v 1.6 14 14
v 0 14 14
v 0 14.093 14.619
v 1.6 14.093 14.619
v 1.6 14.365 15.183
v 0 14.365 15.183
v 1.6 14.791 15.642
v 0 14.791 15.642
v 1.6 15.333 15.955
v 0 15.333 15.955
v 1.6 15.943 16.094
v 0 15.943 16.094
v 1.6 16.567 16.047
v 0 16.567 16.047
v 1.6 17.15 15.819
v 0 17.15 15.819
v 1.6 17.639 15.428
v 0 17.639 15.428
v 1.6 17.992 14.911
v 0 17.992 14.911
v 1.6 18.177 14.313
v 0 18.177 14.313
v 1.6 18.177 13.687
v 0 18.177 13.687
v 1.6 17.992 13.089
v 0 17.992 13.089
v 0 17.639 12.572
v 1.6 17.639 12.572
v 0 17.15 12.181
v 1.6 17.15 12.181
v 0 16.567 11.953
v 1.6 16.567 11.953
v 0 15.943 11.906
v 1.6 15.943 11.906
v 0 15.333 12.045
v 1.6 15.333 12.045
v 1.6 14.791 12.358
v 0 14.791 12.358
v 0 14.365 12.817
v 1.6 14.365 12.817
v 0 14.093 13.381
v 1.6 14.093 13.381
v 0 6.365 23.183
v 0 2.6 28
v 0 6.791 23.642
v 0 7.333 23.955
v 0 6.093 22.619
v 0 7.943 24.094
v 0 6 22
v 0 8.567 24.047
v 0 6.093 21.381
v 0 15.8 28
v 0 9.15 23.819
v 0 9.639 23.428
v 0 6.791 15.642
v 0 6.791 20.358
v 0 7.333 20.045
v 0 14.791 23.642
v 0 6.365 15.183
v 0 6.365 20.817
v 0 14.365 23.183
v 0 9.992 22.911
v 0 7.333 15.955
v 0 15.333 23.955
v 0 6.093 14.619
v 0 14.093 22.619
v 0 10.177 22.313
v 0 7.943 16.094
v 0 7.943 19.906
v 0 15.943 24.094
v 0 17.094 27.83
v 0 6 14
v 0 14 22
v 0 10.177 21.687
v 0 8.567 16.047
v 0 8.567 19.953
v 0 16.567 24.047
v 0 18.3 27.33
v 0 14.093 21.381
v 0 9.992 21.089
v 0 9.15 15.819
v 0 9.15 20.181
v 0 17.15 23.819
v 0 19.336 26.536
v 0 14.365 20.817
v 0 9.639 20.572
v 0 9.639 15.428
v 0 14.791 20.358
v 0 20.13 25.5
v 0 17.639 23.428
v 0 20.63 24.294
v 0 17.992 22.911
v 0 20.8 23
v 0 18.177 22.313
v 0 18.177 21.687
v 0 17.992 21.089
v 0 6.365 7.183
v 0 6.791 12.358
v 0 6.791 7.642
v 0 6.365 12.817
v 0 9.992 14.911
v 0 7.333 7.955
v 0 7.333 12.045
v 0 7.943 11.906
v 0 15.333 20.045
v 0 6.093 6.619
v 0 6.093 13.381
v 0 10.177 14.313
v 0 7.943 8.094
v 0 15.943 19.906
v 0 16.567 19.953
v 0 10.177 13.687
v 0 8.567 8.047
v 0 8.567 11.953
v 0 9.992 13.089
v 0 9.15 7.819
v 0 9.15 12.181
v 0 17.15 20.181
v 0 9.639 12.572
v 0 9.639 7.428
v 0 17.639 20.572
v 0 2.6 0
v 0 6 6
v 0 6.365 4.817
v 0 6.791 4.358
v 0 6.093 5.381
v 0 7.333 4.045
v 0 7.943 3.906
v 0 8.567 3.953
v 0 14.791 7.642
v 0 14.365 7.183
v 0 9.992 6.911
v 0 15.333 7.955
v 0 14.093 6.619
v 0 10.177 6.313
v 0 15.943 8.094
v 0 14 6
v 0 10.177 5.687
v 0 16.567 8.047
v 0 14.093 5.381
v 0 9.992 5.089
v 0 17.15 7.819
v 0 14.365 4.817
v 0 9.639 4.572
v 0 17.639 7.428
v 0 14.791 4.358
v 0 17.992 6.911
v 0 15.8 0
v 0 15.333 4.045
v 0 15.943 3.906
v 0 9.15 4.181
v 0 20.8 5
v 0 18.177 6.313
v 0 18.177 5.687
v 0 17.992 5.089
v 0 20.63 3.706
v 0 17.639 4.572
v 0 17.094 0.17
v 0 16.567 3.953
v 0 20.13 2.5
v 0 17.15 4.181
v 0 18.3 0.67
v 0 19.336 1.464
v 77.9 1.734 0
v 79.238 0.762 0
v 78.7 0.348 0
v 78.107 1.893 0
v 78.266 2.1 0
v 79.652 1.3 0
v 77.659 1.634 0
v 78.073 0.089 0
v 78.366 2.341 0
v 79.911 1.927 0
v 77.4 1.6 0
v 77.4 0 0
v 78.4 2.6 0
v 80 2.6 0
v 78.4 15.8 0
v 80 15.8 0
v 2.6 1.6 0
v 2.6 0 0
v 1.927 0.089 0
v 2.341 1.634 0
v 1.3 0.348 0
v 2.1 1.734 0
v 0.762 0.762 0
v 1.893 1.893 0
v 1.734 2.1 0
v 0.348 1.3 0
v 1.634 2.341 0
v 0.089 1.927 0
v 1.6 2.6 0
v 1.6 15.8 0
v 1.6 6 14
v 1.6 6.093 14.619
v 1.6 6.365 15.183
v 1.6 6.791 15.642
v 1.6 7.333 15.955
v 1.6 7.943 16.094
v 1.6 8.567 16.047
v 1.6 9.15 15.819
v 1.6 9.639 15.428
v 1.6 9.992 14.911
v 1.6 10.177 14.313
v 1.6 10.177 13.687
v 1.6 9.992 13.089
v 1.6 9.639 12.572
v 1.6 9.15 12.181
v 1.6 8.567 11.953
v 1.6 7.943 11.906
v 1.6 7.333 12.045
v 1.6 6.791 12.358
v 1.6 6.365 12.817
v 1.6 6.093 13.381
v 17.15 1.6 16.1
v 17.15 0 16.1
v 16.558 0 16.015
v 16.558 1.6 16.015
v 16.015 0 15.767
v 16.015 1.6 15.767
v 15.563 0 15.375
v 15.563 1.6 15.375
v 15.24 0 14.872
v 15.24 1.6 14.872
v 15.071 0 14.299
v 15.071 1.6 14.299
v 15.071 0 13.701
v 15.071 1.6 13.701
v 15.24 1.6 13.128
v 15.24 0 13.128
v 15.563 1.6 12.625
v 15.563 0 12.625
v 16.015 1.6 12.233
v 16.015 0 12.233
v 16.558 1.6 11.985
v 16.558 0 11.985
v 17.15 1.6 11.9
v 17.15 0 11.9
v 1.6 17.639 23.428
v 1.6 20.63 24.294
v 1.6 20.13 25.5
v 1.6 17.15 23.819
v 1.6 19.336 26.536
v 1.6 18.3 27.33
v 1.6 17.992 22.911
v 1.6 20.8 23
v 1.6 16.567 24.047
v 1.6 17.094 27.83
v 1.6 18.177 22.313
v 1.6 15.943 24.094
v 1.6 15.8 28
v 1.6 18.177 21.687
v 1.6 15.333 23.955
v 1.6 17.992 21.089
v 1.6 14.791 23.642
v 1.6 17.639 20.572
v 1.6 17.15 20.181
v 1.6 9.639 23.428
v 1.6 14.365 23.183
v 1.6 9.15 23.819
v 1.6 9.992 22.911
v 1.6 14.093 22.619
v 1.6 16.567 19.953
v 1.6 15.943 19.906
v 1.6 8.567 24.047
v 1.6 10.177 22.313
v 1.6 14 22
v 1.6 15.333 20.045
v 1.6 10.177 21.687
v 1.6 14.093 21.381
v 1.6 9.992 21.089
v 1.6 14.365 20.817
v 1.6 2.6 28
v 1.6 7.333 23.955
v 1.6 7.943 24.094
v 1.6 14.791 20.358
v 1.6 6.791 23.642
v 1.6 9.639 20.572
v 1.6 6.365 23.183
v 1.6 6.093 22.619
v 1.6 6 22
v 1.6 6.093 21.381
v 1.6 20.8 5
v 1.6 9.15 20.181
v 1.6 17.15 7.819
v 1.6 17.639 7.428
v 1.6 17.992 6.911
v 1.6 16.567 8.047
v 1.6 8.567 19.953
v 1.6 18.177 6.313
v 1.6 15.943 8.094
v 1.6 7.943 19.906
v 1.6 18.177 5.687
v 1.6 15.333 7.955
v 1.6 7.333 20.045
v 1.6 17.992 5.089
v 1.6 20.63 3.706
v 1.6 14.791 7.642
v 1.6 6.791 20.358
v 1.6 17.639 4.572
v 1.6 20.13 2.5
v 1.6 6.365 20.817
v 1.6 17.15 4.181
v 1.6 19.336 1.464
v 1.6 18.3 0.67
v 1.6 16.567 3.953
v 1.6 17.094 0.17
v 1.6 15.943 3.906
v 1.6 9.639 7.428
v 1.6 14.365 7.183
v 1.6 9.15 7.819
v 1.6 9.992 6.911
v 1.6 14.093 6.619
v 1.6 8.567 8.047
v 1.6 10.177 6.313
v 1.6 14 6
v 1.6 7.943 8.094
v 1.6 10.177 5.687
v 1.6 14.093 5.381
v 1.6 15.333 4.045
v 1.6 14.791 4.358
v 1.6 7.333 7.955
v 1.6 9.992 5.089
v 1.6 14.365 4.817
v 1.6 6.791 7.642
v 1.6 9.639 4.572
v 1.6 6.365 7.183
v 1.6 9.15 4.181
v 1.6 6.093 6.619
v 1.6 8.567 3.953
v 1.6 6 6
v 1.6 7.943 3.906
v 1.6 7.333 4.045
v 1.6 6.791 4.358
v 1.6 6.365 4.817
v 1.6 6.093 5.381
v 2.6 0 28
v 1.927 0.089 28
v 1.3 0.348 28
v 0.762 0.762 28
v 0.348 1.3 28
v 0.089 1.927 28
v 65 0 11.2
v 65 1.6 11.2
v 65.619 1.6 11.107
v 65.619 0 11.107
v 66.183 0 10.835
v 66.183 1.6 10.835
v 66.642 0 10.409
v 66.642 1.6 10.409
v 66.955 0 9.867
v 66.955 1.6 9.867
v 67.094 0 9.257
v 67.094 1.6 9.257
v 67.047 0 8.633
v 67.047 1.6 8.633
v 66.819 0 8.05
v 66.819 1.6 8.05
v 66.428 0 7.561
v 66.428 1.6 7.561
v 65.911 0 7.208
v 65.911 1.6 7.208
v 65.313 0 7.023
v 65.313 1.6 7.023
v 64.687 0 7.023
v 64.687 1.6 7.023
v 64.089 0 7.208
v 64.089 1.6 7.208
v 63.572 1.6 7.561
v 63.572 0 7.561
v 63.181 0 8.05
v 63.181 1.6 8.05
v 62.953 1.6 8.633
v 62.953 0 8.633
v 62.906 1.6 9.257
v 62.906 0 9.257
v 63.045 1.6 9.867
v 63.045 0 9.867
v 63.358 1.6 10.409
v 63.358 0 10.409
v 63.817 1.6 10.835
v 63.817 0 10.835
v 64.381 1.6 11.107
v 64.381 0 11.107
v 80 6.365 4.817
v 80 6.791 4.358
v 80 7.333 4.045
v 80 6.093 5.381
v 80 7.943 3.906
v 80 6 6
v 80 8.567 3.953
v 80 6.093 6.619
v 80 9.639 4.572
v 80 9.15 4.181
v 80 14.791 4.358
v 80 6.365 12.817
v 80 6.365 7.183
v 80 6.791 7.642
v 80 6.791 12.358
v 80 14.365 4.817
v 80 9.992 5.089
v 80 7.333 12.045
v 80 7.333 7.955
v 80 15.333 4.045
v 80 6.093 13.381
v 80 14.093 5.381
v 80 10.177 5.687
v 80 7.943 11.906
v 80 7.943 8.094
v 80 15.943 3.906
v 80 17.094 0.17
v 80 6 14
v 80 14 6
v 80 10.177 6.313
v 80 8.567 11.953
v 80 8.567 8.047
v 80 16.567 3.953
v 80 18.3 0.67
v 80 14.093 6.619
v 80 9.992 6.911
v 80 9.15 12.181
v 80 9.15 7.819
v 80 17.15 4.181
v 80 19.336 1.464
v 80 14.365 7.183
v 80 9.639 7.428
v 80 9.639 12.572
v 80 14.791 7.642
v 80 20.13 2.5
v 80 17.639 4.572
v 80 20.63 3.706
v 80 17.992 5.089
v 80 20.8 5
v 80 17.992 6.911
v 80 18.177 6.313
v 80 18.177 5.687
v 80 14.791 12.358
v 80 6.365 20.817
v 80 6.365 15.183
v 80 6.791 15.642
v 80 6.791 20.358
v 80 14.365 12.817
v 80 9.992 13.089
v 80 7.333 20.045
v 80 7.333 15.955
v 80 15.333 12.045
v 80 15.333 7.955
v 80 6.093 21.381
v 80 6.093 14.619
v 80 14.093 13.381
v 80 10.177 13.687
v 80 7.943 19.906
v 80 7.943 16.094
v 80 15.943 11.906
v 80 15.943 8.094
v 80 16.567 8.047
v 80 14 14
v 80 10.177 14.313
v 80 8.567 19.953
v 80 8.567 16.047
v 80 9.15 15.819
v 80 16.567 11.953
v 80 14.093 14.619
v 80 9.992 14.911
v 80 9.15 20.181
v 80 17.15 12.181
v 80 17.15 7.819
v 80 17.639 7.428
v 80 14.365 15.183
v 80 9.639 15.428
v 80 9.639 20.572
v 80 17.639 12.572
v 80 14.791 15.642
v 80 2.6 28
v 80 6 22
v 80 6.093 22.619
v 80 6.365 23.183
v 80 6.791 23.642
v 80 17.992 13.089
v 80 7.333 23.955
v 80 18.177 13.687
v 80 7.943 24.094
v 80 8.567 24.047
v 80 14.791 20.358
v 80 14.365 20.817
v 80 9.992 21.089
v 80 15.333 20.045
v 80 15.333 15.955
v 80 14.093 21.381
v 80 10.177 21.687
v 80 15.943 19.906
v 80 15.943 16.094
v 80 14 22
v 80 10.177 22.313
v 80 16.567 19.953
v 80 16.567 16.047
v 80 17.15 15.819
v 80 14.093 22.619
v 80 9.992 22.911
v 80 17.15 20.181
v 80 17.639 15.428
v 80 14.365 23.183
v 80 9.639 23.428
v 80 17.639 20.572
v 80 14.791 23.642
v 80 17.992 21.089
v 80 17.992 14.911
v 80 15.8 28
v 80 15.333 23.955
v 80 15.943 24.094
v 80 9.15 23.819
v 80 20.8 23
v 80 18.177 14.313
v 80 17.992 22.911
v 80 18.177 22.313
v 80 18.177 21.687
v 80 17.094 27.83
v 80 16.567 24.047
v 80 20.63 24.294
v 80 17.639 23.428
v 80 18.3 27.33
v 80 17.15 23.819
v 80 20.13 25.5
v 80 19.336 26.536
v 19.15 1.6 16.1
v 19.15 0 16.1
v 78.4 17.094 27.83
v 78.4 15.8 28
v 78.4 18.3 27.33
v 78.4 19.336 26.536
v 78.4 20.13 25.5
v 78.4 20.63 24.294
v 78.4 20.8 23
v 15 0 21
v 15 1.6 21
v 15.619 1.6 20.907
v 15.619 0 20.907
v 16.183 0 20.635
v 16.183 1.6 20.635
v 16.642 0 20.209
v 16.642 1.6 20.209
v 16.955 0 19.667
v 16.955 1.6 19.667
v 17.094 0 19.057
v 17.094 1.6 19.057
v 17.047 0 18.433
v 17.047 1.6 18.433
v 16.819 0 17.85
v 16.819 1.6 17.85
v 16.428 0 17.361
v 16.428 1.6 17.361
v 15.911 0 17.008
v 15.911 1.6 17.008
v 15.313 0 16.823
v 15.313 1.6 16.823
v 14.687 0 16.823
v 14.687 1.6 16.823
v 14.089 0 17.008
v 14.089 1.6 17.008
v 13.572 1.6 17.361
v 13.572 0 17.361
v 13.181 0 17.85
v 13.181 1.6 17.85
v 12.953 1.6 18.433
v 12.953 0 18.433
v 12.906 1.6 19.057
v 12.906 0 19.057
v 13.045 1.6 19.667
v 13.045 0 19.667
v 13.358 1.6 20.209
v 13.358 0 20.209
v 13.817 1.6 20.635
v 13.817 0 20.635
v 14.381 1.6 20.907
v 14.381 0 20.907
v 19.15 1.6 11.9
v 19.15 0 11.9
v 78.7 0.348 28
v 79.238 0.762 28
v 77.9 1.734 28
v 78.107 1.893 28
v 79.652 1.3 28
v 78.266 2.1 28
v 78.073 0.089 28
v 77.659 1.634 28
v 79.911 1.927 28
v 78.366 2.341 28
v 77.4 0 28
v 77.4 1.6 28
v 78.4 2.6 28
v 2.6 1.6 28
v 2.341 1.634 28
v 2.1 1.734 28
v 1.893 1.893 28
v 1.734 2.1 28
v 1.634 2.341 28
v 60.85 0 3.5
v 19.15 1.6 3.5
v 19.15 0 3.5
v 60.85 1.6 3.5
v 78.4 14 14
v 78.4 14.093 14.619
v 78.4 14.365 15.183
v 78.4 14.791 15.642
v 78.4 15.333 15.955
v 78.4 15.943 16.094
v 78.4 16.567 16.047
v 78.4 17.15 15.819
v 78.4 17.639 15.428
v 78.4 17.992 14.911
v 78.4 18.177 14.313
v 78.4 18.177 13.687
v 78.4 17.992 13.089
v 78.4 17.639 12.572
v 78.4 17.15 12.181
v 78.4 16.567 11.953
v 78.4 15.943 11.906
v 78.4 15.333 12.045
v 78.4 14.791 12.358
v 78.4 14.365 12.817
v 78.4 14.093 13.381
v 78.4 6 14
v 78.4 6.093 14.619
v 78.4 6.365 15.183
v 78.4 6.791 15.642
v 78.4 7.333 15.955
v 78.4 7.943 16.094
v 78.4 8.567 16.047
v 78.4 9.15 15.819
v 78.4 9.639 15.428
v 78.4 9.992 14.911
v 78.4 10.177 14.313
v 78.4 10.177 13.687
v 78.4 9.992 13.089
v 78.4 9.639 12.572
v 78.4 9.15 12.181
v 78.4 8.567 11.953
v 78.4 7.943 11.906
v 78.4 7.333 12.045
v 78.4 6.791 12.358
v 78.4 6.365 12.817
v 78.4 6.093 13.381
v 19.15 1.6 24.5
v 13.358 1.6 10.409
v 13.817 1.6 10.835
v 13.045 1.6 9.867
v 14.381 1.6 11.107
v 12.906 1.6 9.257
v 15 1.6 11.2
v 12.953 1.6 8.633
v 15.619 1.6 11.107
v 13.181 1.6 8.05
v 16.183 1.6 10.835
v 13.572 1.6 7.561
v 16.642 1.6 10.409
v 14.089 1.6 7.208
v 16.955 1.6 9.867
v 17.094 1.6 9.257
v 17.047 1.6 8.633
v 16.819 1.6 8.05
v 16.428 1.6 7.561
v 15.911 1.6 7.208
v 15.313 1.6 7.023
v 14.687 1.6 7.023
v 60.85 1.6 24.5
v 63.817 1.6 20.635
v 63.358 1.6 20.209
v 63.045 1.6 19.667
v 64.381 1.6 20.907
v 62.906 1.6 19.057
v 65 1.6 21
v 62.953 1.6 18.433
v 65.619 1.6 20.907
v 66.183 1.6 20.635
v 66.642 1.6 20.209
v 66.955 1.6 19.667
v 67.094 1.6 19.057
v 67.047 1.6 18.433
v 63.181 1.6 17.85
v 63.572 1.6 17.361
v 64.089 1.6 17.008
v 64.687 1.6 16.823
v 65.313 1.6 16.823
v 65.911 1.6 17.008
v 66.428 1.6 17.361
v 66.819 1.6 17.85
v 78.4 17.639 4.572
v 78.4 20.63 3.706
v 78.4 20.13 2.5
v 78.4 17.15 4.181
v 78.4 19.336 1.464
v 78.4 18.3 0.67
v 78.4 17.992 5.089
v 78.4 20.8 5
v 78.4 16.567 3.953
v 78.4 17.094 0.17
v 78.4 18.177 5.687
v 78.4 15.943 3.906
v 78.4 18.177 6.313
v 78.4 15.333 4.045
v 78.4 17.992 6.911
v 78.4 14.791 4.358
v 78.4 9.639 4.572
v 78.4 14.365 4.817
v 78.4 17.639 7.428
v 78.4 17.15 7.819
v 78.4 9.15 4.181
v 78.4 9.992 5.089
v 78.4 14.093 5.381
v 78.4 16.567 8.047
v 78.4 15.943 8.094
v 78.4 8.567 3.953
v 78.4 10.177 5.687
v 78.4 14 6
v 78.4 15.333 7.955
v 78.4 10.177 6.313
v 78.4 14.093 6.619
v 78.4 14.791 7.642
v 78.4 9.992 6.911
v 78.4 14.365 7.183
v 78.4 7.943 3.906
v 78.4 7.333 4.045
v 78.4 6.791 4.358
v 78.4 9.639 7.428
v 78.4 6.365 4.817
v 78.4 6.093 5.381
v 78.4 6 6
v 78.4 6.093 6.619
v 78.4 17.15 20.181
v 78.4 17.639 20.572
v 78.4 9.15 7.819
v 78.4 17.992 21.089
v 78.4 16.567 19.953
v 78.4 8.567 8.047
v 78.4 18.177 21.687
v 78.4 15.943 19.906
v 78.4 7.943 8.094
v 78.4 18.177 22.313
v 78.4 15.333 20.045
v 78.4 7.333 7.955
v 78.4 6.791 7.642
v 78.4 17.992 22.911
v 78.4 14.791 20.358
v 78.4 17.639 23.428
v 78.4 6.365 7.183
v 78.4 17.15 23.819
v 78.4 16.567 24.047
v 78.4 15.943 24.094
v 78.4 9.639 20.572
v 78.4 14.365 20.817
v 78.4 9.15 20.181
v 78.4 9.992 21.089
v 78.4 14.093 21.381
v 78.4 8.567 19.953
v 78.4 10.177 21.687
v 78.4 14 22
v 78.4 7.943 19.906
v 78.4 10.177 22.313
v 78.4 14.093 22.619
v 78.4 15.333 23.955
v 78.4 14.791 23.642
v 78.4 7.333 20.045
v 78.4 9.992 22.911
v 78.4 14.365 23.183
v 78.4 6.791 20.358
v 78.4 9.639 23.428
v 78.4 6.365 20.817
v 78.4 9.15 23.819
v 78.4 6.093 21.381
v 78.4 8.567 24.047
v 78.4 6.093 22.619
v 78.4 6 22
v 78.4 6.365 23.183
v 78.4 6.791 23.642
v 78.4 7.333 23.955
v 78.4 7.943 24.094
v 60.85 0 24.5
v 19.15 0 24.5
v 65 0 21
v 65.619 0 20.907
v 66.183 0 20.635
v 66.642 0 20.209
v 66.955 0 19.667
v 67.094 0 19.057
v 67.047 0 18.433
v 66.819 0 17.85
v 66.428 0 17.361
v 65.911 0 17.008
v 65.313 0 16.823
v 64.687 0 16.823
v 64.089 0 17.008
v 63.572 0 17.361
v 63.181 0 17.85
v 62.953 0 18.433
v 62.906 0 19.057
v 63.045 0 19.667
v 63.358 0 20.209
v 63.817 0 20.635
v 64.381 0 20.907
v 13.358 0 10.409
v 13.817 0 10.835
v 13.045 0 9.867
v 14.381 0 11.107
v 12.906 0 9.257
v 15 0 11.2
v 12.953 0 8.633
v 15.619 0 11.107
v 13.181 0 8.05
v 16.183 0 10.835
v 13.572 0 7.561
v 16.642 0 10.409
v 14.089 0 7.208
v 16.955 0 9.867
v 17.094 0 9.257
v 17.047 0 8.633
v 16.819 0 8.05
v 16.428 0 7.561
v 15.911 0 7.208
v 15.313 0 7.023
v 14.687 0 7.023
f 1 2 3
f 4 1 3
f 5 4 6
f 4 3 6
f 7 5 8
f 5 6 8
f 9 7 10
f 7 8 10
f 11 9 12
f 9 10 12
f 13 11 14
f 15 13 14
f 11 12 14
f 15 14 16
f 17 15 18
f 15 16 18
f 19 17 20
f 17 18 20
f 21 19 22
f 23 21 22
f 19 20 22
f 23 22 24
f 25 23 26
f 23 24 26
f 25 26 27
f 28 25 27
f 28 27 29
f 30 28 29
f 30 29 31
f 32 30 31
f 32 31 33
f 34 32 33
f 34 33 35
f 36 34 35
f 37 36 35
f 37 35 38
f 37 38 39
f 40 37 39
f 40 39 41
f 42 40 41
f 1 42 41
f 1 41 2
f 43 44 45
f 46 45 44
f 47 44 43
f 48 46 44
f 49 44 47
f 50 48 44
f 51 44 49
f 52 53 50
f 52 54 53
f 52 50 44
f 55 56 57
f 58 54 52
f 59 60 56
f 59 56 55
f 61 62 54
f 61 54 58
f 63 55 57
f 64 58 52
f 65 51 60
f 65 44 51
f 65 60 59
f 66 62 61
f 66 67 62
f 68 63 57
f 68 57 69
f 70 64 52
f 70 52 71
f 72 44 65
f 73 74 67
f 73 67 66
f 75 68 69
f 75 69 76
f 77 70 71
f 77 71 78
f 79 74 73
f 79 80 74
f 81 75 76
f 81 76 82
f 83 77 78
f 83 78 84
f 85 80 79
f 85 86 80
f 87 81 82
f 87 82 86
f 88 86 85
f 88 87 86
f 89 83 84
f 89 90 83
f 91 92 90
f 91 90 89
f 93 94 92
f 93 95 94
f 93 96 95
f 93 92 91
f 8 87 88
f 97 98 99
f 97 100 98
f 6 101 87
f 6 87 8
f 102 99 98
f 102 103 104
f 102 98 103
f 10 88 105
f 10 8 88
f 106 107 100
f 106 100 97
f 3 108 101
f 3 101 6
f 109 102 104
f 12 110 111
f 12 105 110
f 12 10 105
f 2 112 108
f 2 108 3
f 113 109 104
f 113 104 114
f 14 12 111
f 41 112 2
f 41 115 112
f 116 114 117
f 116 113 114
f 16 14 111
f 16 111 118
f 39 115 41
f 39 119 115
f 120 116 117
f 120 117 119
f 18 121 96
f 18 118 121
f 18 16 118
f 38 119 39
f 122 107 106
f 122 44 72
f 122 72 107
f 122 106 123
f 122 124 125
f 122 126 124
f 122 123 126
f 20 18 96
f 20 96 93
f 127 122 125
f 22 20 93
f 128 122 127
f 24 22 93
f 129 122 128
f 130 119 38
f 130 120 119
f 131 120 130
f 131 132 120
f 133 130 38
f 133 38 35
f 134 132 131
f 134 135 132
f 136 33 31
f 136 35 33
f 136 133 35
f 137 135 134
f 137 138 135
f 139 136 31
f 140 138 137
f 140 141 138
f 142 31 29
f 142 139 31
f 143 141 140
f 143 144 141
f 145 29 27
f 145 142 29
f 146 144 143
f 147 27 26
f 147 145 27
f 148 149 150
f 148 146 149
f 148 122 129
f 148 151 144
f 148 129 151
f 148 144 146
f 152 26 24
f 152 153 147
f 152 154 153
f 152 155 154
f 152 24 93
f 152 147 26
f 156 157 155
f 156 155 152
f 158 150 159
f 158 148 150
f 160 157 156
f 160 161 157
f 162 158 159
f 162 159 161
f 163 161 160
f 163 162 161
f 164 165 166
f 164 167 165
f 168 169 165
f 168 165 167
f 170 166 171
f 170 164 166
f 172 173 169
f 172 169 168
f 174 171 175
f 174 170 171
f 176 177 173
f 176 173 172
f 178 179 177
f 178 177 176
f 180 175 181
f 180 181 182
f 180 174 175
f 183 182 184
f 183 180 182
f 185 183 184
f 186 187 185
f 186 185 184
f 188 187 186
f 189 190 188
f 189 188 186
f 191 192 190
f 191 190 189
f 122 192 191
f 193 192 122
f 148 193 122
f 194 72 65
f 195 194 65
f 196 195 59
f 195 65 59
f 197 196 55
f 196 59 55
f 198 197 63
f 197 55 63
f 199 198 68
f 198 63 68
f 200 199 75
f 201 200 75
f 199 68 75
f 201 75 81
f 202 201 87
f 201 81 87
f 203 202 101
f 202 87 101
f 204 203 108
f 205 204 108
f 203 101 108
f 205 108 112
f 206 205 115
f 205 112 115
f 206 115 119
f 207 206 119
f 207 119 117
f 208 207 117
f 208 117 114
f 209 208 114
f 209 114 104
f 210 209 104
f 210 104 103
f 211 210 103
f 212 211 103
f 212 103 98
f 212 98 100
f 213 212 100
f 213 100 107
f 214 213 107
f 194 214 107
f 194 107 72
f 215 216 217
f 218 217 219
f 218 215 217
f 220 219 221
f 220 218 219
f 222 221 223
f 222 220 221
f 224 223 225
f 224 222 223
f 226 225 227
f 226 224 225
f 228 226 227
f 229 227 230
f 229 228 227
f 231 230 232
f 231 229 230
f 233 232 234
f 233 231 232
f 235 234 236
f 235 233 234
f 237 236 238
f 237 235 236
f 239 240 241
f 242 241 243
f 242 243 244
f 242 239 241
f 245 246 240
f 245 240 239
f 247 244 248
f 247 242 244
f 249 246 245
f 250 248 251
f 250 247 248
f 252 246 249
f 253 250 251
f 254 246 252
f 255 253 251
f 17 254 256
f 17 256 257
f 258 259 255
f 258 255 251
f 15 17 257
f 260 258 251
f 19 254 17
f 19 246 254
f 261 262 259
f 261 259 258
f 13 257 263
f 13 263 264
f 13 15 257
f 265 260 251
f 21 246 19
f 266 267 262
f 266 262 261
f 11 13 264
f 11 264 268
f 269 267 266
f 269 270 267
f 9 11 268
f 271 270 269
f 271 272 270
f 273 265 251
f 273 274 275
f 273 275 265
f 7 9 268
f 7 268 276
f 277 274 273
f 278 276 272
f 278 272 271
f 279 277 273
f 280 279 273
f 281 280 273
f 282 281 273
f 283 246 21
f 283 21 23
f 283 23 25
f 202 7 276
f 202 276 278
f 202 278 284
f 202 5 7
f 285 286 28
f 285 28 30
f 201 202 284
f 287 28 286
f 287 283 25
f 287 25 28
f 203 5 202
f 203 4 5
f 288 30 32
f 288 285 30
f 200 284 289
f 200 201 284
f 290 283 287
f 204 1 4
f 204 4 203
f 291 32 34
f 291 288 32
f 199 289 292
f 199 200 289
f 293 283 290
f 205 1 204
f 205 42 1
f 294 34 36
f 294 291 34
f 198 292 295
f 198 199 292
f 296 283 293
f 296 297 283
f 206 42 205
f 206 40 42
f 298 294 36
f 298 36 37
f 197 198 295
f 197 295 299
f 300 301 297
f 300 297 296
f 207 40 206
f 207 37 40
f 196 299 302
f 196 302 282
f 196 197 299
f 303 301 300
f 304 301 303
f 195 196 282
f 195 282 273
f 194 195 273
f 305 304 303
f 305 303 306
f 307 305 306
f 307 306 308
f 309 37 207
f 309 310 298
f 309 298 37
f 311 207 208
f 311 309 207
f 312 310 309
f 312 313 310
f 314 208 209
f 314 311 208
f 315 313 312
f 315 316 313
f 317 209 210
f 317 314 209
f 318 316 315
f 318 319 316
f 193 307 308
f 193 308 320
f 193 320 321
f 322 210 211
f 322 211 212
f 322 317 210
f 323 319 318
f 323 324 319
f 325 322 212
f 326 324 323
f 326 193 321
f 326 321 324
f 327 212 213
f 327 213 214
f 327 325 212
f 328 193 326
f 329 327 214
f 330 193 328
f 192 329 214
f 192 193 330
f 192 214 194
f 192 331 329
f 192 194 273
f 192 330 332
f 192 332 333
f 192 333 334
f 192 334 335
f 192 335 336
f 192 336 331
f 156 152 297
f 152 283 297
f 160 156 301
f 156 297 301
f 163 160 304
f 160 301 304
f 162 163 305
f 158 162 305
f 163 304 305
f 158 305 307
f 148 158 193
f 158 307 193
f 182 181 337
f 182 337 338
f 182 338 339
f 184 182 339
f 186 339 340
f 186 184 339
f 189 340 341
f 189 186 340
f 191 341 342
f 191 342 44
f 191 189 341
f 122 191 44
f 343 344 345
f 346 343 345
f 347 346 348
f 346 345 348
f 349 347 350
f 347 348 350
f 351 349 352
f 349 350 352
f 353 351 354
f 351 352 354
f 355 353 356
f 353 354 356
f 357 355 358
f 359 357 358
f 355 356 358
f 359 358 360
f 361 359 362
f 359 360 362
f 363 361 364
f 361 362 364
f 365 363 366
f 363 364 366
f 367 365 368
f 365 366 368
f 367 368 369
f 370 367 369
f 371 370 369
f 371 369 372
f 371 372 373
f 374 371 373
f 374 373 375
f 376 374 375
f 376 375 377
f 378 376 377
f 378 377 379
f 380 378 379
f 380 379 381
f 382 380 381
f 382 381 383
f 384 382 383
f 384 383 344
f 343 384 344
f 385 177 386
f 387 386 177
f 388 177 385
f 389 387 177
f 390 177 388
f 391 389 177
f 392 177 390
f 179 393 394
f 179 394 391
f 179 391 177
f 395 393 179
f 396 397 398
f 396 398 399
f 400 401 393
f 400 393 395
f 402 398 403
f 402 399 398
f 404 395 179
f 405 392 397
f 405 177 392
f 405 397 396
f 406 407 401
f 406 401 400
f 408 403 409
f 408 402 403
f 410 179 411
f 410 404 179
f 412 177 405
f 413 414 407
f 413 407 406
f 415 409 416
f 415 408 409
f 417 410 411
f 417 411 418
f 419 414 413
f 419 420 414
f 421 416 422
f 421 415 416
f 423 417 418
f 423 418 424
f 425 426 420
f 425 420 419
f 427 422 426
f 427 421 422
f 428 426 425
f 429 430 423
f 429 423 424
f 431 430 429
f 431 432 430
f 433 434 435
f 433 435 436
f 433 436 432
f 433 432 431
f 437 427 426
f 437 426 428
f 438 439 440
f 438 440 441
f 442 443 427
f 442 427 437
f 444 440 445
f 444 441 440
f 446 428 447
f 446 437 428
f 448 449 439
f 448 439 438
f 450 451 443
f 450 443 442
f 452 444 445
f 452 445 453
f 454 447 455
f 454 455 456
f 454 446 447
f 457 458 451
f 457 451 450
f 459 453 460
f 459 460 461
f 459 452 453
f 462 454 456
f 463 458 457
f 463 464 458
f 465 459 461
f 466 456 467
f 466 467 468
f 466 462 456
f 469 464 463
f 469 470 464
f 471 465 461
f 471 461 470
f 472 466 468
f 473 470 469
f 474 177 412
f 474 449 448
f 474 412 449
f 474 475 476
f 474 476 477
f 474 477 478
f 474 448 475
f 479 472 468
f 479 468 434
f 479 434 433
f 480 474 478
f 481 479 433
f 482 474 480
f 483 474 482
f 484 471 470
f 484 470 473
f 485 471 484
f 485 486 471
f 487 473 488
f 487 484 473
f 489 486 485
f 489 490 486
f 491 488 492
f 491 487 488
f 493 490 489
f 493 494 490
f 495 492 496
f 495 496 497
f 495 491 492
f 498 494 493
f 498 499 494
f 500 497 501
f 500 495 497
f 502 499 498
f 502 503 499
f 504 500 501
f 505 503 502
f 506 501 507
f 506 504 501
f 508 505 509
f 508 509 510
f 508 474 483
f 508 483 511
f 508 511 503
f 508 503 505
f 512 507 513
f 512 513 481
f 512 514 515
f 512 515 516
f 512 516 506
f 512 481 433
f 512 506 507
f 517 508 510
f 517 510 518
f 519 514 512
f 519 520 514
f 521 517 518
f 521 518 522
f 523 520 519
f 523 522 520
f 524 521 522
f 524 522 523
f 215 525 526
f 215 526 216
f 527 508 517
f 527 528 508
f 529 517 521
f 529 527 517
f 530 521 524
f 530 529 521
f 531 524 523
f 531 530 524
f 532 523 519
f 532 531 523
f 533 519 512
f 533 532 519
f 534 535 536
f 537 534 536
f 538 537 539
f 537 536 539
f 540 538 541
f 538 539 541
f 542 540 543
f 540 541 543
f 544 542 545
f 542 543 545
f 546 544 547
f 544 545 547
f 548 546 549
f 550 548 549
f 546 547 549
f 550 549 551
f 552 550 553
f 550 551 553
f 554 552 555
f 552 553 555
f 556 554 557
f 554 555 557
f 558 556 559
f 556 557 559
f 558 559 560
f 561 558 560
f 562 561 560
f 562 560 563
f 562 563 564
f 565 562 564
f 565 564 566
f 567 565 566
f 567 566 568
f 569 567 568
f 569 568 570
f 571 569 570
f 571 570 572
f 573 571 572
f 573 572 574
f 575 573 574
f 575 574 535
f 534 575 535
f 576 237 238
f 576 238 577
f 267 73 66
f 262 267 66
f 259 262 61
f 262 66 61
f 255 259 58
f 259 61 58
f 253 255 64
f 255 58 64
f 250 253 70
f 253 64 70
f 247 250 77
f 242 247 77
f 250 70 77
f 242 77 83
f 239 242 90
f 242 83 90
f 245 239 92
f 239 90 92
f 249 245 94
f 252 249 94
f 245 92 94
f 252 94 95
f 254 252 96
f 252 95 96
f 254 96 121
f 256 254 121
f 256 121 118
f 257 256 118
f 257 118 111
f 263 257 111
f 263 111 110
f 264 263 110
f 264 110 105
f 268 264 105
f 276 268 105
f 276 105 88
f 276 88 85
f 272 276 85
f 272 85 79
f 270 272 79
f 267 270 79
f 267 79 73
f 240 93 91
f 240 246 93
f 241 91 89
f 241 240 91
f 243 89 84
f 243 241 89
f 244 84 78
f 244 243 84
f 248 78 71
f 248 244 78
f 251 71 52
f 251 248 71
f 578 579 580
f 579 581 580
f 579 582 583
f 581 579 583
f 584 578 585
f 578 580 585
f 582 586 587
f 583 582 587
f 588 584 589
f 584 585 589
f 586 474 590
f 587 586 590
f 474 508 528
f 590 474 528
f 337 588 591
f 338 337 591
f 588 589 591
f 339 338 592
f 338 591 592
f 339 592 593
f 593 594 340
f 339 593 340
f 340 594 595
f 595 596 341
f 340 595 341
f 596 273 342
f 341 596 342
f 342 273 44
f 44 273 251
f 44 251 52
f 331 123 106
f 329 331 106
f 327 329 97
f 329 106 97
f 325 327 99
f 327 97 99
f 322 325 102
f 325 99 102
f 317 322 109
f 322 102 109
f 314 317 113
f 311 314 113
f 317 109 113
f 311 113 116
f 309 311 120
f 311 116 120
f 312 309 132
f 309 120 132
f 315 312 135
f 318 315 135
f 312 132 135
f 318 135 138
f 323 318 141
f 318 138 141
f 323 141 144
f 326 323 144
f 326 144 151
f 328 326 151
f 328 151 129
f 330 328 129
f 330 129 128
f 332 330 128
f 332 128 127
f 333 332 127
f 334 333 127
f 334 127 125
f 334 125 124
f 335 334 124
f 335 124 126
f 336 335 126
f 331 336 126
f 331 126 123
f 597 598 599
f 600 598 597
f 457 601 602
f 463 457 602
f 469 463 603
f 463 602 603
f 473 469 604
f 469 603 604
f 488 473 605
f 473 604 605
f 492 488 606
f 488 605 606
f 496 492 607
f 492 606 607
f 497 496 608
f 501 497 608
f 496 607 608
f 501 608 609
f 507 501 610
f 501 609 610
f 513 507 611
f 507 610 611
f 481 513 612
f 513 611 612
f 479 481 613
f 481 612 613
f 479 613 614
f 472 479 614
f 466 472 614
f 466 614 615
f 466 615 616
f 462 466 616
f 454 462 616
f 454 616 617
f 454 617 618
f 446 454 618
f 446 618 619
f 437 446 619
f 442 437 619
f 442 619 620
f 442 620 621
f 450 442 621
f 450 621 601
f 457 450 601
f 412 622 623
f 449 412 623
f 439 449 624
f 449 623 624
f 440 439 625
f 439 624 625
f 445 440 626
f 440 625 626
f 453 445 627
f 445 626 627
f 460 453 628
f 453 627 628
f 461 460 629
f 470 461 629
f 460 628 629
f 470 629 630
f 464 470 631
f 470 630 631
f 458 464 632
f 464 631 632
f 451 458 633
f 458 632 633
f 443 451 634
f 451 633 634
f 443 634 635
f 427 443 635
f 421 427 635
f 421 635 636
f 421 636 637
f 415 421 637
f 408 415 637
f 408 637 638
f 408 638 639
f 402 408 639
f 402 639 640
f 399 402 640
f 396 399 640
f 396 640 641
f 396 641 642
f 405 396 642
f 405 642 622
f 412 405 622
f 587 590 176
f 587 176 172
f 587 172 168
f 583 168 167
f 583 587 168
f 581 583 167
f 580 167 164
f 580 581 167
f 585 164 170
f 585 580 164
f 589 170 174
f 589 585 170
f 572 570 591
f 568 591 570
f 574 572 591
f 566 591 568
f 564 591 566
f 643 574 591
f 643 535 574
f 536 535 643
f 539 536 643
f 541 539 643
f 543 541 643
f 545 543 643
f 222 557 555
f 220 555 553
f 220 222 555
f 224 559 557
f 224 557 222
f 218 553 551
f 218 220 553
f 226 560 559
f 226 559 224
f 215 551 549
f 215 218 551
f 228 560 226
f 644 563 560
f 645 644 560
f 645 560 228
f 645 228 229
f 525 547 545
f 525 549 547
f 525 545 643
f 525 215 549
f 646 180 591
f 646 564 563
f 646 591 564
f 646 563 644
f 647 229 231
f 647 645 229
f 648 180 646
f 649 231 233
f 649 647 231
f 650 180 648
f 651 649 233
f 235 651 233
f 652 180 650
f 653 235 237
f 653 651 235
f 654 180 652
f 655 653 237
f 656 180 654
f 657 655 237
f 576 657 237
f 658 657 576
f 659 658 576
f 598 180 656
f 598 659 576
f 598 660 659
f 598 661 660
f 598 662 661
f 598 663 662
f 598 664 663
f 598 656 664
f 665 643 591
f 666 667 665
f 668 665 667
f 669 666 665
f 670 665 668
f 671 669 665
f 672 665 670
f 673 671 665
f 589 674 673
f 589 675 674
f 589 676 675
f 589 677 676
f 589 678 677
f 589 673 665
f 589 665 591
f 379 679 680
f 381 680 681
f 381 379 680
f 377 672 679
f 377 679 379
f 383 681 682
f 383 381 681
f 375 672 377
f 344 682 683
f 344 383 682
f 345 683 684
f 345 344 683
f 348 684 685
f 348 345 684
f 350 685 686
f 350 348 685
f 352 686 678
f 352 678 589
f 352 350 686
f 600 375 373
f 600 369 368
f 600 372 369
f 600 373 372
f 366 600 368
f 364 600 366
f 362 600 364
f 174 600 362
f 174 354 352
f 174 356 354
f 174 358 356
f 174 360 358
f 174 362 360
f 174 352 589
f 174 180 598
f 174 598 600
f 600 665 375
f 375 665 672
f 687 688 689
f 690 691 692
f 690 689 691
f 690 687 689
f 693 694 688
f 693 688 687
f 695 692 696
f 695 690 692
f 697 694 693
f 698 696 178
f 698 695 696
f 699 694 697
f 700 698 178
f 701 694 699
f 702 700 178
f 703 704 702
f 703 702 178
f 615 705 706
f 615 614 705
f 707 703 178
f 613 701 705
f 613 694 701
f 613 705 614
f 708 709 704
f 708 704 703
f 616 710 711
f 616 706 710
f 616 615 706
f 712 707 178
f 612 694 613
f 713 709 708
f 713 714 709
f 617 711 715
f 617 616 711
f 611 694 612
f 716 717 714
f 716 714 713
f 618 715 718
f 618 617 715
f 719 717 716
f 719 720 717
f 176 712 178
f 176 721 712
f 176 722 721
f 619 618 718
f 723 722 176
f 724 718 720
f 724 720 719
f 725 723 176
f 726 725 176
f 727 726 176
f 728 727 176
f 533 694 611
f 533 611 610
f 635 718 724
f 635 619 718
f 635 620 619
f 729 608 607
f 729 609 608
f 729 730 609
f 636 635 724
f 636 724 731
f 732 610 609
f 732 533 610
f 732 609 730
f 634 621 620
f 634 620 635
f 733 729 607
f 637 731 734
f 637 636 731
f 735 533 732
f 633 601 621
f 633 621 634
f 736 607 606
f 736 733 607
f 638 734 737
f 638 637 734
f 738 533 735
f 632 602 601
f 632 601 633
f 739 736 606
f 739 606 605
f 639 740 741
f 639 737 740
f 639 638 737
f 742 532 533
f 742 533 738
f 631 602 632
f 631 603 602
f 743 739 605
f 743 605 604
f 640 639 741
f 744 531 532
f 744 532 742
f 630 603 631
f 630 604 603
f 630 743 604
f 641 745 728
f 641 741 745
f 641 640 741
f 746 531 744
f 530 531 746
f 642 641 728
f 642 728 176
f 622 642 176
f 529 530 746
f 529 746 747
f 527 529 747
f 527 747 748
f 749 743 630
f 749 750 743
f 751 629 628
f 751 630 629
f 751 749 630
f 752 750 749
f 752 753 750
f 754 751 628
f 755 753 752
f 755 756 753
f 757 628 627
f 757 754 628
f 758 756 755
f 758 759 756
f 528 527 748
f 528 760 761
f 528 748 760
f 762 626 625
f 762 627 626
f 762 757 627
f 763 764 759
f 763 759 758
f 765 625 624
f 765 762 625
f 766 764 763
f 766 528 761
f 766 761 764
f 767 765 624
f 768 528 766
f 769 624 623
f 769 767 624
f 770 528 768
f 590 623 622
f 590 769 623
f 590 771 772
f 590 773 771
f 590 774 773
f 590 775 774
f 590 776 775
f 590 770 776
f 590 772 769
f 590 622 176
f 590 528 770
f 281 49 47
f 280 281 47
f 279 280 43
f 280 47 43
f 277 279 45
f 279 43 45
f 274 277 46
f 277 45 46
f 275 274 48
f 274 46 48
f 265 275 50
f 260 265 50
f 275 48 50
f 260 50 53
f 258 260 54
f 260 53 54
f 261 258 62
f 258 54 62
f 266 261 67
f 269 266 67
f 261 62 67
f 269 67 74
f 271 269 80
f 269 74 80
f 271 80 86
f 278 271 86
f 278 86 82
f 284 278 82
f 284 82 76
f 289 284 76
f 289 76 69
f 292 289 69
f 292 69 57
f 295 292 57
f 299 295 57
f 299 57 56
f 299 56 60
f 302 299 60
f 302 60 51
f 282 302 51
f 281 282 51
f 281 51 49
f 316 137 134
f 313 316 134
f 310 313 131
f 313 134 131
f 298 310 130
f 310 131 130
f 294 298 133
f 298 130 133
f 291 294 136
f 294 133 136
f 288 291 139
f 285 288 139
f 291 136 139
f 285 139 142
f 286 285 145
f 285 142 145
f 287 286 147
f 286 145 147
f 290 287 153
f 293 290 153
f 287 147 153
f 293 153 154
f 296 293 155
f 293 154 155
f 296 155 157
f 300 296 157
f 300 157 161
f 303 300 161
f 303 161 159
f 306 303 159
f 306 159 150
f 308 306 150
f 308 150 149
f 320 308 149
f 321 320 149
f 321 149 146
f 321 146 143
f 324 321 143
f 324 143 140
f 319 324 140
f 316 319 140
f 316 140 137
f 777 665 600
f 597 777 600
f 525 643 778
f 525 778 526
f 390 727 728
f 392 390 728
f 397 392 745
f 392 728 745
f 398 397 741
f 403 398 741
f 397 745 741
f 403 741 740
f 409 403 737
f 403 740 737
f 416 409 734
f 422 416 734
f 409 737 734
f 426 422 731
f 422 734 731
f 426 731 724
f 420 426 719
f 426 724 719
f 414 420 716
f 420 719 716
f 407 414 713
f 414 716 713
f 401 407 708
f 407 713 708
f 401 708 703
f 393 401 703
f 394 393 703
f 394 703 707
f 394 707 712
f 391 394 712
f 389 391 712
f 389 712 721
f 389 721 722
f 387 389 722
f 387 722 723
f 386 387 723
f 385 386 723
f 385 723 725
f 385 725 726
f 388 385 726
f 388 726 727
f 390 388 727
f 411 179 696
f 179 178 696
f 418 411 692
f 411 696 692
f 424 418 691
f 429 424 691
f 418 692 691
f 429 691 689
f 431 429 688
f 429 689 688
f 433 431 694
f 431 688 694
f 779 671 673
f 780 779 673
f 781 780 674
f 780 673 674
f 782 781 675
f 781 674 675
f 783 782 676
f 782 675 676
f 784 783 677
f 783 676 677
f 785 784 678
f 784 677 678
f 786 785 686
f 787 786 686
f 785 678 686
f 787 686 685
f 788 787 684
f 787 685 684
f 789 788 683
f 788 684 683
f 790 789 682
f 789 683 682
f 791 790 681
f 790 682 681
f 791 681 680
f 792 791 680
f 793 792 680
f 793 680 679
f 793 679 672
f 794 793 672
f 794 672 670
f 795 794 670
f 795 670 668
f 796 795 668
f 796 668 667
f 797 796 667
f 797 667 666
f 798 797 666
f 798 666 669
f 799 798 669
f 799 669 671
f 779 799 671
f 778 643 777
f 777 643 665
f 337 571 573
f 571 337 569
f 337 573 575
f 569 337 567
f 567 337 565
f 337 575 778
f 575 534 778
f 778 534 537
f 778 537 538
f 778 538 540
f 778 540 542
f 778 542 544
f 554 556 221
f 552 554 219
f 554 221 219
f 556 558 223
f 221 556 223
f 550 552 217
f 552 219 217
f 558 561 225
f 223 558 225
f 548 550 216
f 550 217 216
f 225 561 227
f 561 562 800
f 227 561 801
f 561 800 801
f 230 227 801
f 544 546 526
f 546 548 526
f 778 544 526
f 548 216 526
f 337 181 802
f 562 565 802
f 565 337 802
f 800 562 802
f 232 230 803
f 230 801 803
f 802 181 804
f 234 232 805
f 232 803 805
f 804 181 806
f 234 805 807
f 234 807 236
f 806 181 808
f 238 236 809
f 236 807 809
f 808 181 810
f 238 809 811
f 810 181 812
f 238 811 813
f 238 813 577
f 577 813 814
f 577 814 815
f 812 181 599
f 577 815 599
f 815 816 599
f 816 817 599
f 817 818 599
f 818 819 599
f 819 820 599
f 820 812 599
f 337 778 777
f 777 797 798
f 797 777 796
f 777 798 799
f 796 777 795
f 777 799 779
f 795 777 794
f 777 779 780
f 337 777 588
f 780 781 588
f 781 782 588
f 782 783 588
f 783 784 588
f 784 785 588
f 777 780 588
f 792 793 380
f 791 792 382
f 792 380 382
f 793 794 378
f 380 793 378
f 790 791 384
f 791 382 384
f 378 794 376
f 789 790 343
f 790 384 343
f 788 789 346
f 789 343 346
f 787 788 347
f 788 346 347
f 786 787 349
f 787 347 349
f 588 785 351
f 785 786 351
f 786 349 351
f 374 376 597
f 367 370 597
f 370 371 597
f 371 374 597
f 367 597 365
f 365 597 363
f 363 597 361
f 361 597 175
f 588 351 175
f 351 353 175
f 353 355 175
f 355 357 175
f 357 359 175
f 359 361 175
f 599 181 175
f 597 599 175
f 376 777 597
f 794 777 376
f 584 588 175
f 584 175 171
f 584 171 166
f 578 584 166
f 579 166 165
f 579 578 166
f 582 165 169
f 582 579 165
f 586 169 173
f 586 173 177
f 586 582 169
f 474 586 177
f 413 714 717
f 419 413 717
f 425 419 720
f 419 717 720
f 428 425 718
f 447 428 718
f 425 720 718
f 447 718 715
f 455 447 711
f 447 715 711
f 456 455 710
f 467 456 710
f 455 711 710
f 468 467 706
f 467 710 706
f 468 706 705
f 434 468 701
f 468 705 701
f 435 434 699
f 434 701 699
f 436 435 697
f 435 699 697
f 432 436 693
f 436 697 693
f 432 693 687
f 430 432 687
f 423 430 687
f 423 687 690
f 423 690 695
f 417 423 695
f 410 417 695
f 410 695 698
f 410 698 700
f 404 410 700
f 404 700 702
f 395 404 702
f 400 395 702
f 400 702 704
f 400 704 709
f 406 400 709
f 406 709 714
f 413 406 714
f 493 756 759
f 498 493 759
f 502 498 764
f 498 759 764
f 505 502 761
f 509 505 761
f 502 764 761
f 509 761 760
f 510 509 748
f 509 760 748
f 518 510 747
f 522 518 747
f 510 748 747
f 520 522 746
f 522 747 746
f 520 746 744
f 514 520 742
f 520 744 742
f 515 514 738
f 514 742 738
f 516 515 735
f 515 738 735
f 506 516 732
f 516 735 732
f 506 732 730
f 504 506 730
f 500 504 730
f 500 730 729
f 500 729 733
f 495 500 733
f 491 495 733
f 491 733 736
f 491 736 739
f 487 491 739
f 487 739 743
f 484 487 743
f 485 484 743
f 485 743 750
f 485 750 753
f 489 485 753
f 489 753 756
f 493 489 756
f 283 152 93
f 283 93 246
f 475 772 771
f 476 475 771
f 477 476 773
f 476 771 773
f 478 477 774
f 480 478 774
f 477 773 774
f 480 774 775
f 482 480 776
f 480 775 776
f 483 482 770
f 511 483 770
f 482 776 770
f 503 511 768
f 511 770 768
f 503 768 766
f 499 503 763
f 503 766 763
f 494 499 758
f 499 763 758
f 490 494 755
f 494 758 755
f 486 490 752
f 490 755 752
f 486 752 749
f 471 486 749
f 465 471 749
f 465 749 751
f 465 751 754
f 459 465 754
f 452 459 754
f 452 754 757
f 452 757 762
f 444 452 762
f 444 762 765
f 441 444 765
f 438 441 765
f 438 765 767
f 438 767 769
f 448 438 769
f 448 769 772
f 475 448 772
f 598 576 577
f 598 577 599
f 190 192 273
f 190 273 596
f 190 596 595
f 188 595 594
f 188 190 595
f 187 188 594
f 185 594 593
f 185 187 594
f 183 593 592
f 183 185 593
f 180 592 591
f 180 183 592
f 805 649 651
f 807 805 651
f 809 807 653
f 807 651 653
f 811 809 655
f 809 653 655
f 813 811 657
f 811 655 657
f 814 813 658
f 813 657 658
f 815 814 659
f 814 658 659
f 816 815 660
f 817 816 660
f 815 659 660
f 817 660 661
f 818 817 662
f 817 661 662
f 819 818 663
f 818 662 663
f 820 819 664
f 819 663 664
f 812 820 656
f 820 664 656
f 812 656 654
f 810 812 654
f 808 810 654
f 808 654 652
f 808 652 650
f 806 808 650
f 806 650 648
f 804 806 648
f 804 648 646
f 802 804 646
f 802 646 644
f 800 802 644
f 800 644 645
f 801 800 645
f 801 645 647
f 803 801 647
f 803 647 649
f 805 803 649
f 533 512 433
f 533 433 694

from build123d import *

# Parameters (mm, degrees)
SKETCH1_W                      = 80
SKETCH1_H                      = 28
BOSS_EXTRUDE1_DEPTH            = 1.6
SKETCH2_R                      = 2.1
CUT_EXTRUDE1_DEPTH             = 85.77358079
LPATTERN1_COUNT                = 2
LPATTERN1_PITCH                = 50
LPATTERN1_COUNT_DIR2           = 2
LPATTERN1_PITCH_DIR2           = 9.8
SKETCH15_W                     = 41.7
SKETCH15_H                     = 21
CUT_EXTRUDE3_DEPTH             = 85.77358079
EDGE_FLANGE1_STRIP_W           = 8.4
EDGE_FLANGE1_STRIP_H           = 1.6
EDGE_FLANGE1_STRIP_CUT_DEPTH   = 28
EDGE_FLANGE1_STRIP_2_W         = 8.4
EDGE_FLANGE1_STRIP_2_H         = 1.6
EDGE_FLANGE1_STRIP_CUT_2_DEPTH = 28
EDGE_FLANGE1_DEPTH             = 28
EDGE_FLANGE1_BEND_DEPTH        = 28
FILLET1_R                      = 5
SKETCH14_R                     = 2.1
CUT_EXTRUDE2_DEPTH             = 88.273363634
LPATTERN2_COUNT                = 3
LPATTERN2_PITCH                = 8
LPATTERN2_COUNT_DIR2           = 2
LPATTERN2_PITCH_DIR2           = 8
CUT_EXTRUDE4_DEPTH             = 10


# Sheet-metal steps are written as plain solids
with BuildPart() as part:
    # Sketch1 → Boss-Extrude1 (new body)
    with BuildSketch(Plane(origin=(0, 0, 0), x_dir=(1, 0, 0), z_dir=(0, 1, 0))):
        with Locations((40, -14)):
            Rectangle(SKETCH1_W, SKETCH1_H)
    extrude(amount=BOSS_EXTRUDE1_DEPTH)

    # Sketch2 → Cut-Extrude1 (cut, through all)
    with BuildSketch(Plane(origin=(0, 1.6, 0), x_dir=(1, 0, 0), z_dir=(0, 1, 0))):
        with Locations(Location((15, -9.1, 0), (0, 0, 270))):
            Circle(SKETCH2_R)
    cut_extrude1 = extrude(amount=-CUT_EXTRUDE1_DEPTH, mode=Mode.SUBTRACT)

    # LPattern1: Cut-Extrude1 2 × 2
    with Locations(*[(i * LPATTERN1_PITCH, 0, j * LPATTERN1_PITCH_DIR2) for i in range(LPATTERN1_COUNT) for j in range(LPATTERN1_COUNT_DIR2) if (i, j) != (0, 0)]):
        add(cut_extrude1, mode=Mode.SUBTRACT)

    # Sketch15 → Cut-Extrude3 (cut, through all)
    with BuildSketch(Plane(origin=(0, 1.6, 0), x_dir=(1, 0, 0), z_dir=(0, 1, 0))):
        with Locations((40, -14)):
            Rectangle(SKETCH15_W, SKETCH15_H)
    extrude(amount=-CUT_EXTRUDE3_DEPTH, mode=Mode.SUBTRACT)

    # Edge-Flange1 strip (across the edge) → Edge-Flange1 strip cut (cut)
    with BuildSketch(Plane(origin=(80, 1.6, 28), x_dir=(-1, 0, 0), z_dir=(0, 0, -1))):
        with Locations((-1.6, -0.8)):
            Rectangle(EDGE_FLANGE1_STRIP_W, EDGE_FLANGE1_STRIP_H)
    extrude(amount=EDGE_FLANGE1_STRIP_CUT_DEPTH, mode=Mode.SUBTRACT)

    # Edge-Flange1 strip 2 (across the edge) → Edge-Flange1 strip cut 2 (cut)
    with BuildSketch(Plane(origin=(0, 1.6, 0), x_dir=(1, 0, 0), z_dir=(0, 0, 1))):
        with Locations((-1.6, -0.8)):
            Rectangle(EDGE_FLANGE1_STRIP_2_W, EDGE_FLANGE1_STRIP_2_H)
    extrude(amount=EDGE_FLANGE1_STRIP_CUT_2_DEPTH, mode=Mode.SUBTRACT)

    # Edge-Flange1 section (across the edge) → Edge-Flange1 (add)
    with BuildSketch(Plane(origin=(80, 1.6, 28), x_dir=(-1, 0, 0), z_dir=(0, 0, -1))):
        with BuildLine():
            Line((0, 1), (0, 19.2))
            Line((0, 19.2), (1.6, 19.2))
            Line((1.6, 19.2), (1.6, 1))
            ThreePointArc((1.6, 1), (1.892893219, 0.292893219), (2.6, 0))
            Line((2.6, 0), (2.6, -1.6))
            ThreePointArc((2.6, -1.6), (0.761522369, -0.838477631), (0, 1))
        make_face()
    extrude(amount=EDGE_FLANGE1_DEPTH)

    # Edge-Flange1 section 2 (across the edge) → Edge-Flange1 bend (add)
    with BuildSketch(Plane(origin=(0, 1.6, 0), x_dir=(1, 0, 0), z_dir=(0, 0, 1))):
        with BuildLine():
            Line((0, 1), (0, 19.2))
            Line((0, 19.2), (1.6, 19.2))
            Line((1.6, 19.2), (1.6, 1))
            ThreePointArc((1.6, 1), (1.892893219, 0.292893219), (2.6, 0))
            Line((2.6, 0), (2.6, -1.6))
            ThreePointArc((2.6, -1.6), (0.761522369, -0.838477631), (0, 1))
        make_face()
    extrude(amount=EDGE_FLANGE1_BEND_DEPTH)

    # Fillet1
    fillet1_edges = [part.edges().sort_by_distance(p)[0] for p in [
        (79.2, 20.8, 28),
        (79.2, 20.8, 0),
        (0.8, 20.8, 0),
        (0.8, 20.8, 28),
    ]]
    fillet(fillet1_edges, radius=FILLET1_R)

    # Sketch14 → Cut-Extrude2 (cut, through all)
    with BuildSketch(Plane.ZY):
        with Locations(Location((6, 8.1, 0), (0, 0, 270))):
            Circle(SKETCH14_R)
    cut_extrude2 = extrude(amount=-CUT_EXTRUDE2_DEPTH, mode=Mode.SUBTRACT)

    # LPattern2: Cut-Extrude2 3 × 2
    with Locations(*[(0, j * LPATTERN2_PITCH_DIR2, i * LPATTERN2_PITCH) for i in range(LPATTERN2_COUNT) for j in range(LPATTERN2_COUNT_DIR2) if (i, j) != (0, 0)]):
        add(cut_extrude2, mode=Mode.SUBTRACT)

    # Sketch16 → Cut-Extrude4 (cut)
    with BuildSketch(Plane(origin=(0, 1.6, 0), x_dir=(1, 0, 0), z_dir=(0, 1, 0))):
        with BuildLine():
            Line((21.15, -16.1), (17.15, -16.1))
            ThreePointArc((17.15, -16.1), (15.05, -14), (17.15, -11.9))
            Line((17.15, -11.9), (21.15, -11.9))
            ThreePointArc((21.15, -11.9), (23.25, -14), (21.15, -16.1))
        make_face()
    extrude(amount=-CUT_EXTRUDE4_DEPTH, mode=Mode.SUBTRACT)


solid = part.part
